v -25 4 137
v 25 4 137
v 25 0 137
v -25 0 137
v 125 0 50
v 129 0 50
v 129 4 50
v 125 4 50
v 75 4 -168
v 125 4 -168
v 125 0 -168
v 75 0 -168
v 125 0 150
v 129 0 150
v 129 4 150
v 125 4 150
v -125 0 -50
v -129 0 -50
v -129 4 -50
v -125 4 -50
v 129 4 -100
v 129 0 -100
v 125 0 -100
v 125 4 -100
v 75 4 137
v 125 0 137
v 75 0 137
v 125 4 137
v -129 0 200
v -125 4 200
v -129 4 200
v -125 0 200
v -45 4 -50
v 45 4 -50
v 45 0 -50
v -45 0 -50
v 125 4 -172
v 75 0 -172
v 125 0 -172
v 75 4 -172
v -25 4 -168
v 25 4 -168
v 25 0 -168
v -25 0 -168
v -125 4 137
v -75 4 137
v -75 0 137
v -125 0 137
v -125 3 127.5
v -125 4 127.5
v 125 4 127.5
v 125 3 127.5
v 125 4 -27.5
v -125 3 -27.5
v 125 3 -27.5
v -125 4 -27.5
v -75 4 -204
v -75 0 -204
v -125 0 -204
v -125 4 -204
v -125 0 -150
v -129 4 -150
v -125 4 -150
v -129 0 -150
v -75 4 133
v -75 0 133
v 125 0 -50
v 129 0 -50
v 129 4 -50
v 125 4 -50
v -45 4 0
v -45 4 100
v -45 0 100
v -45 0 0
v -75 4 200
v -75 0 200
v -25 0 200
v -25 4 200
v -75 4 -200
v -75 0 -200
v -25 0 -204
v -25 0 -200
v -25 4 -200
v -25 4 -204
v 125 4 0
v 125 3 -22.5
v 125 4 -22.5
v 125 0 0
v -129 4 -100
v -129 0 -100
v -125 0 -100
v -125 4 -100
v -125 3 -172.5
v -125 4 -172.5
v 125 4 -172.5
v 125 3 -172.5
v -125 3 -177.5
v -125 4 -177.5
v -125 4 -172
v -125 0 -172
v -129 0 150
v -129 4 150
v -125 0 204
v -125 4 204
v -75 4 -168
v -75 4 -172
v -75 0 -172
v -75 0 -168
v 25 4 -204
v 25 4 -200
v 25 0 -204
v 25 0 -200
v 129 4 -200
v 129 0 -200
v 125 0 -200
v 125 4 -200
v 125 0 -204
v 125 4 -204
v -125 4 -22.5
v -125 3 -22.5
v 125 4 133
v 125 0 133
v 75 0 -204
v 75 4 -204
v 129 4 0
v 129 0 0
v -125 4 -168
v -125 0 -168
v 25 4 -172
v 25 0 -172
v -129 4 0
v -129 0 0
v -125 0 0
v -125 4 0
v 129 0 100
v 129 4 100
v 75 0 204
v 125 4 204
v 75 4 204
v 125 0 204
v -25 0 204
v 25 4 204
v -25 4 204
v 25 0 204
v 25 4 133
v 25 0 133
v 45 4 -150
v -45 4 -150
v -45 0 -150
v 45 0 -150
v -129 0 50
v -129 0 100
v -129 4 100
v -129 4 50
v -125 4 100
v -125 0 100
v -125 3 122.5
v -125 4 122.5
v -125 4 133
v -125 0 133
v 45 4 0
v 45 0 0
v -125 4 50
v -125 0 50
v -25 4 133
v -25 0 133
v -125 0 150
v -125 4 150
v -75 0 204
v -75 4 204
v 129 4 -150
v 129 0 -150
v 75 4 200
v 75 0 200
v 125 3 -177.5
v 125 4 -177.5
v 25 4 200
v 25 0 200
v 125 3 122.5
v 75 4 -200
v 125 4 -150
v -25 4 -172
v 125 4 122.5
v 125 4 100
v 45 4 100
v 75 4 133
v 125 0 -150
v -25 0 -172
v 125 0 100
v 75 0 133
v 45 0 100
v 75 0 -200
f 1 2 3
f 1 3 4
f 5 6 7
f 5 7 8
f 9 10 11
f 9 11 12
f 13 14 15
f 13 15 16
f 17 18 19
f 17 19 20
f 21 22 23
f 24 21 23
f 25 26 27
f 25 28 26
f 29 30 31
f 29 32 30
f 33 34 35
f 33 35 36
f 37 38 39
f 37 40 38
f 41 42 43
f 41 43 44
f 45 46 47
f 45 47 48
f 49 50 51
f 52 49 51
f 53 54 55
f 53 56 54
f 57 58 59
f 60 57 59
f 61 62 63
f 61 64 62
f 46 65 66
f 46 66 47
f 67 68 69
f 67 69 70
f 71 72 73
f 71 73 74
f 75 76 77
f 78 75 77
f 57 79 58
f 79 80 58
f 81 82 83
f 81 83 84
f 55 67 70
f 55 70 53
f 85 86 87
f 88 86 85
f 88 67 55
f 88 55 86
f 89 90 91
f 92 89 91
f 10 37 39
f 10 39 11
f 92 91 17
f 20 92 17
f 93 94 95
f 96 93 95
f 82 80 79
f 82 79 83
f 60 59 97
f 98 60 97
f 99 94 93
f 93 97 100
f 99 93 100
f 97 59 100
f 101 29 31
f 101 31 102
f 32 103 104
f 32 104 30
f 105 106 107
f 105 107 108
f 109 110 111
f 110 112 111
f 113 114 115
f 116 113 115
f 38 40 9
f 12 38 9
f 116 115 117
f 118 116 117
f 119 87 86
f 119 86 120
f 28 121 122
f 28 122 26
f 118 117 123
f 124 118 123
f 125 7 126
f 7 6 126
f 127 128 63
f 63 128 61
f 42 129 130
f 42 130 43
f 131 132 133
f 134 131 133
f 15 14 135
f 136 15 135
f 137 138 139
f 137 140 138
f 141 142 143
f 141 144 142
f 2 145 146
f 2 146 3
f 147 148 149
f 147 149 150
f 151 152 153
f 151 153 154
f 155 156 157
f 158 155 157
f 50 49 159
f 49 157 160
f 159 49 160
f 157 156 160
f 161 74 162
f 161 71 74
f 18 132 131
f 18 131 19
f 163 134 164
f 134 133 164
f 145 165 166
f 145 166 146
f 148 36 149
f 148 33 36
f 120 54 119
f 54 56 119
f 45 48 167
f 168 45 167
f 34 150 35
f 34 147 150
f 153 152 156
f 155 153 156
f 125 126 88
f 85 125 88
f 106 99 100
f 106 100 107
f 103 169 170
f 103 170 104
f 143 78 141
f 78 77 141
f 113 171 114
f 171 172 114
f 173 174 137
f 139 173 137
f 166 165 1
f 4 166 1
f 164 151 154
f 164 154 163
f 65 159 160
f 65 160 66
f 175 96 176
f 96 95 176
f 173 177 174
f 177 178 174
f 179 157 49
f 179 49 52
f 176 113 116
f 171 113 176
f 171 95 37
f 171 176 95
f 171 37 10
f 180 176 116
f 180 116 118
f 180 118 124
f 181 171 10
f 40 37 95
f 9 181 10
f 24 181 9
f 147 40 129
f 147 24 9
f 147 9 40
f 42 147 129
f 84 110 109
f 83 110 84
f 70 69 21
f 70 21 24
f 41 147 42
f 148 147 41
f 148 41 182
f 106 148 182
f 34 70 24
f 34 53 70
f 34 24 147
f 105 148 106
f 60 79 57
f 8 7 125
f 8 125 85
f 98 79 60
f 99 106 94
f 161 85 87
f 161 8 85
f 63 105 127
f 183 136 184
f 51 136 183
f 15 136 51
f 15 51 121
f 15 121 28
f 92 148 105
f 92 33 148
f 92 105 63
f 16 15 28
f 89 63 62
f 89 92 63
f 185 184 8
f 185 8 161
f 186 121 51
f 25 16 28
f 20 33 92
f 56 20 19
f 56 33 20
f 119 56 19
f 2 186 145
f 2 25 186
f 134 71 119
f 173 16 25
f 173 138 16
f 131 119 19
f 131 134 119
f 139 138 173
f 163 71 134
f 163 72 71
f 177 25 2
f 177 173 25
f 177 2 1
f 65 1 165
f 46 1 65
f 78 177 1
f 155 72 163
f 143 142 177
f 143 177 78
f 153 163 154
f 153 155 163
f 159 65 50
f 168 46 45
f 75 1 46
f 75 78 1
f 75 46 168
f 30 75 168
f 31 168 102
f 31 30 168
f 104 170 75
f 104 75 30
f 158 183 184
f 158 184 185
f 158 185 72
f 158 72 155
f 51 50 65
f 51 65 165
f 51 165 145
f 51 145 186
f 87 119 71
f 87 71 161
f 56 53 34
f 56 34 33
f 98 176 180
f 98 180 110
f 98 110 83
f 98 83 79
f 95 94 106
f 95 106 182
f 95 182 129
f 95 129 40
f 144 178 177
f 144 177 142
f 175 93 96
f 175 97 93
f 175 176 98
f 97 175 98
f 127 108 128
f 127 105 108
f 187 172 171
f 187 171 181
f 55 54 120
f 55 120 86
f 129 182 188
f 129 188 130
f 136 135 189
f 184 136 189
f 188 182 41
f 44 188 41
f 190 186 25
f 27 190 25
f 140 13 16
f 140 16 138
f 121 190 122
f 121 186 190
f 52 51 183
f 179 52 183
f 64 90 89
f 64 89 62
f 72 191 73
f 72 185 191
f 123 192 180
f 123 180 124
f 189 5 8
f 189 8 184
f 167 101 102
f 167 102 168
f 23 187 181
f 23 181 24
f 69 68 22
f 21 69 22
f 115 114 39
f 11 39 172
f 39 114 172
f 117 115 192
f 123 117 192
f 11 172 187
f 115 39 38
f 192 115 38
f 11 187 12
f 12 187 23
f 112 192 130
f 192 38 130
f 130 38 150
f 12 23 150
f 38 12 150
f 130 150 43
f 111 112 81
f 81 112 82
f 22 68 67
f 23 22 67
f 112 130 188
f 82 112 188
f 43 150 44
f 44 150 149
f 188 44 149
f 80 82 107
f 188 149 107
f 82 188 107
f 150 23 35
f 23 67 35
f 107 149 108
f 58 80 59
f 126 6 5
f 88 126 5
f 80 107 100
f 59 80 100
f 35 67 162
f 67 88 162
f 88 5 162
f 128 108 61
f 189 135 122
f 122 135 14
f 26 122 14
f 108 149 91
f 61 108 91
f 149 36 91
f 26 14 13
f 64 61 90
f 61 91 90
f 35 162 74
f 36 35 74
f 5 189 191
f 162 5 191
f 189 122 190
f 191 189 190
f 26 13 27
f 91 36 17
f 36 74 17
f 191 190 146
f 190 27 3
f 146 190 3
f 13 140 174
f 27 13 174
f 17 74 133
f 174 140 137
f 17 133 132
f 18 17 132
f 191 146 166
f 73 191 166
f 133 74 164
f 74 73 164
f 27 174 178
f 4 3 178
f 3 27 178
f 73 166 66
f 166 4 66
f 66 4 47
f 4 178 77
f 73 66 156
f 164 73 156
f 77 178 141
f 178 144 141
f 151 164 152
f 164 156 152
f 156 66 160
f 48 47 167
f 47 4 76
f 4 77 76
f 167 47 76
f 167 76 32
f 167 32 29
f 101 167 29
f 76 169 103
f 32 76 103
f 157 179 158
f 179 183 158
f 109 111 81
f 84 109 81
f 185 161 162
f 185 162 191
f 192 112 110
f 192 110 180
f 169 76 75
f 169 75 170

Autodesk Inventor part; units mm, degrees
ref_plane "YZ Plane" through (0, 0, 0) normal (1, 0, 0) x (0, 1, 0)
ref_plane "XZ Plane" through (0, 0, 0) normal (0, 1, 0) x (-1, 0, 0)
ref_plane "XY Plane" through (0, 0, 0) normal (0, 0, 1) x (1, 0, 0)
sketch "Sketch1" plane through (0, 0, 0) normal (0, 1, 0) x (-1, 0, 0)
  line L0 (-125, 200) -> (125, 200) construction
  line L1 (125, 200) -> (125, -200) construction
  line L2 (125, -200) -> (-125, -200) construction
  line L3 (-125, -200) -> (-125, 200) construction
  line L4 (-125, 200) -> (125, -200) construction
  line L5 (125, 200) -> (-125, -200) construction
  line L6 (125, 200) -> (75, 200) construction
  line L7 (75, 200) -> (75, 204)
  line L8 (75, 204) -> (125, 204)
  line L9 (125, 204) -> (125, 200)
  line L10 (125, 200) -> (129, 200)
  line L11 (129, 200) -> (129, 150)
  line L12 (129, 150) -> (125, 150)
  line L13 (125, 150) -> (125, 200) construction
  line L14 (-125, 200) -> (-129, 200) construction
  line L15 (-129, 200) -> (-129, 150) construction
  line L16 (-129, 150) -> (-125, 150)
  line L17 (-125, 150) -> (-125, 200)
  line L18 (125, -200) -> (75, -200) construction
  line L19 (75, -200) -> (75, -204)
  line L20 (75, -204) -> (125, -204)
  line L21 (125, -204) -> (125, -200)
  line L22 (125, 100) -> (125, 150)
  line L23 (125, 150) -> (129, 150)
  line L24 (129, 100) -> (125, 100)
  line L25 (129, 150) -> (129, 100) construction
  line L26 (-125, 100) -> (-125, 150) construction
  line L27 (-125, 150) -> (-129, 150)
  line L28 (-129, 150) -> (-129, 100)
  line L29 (-129, 100) -> (-125, 100)
  line L30 (125, 50) -> (125, 100) construction
  line L31 (125, 100) -> (129, 100)
  line L32 (129, 50) -> (125, 50)
  line L33 (129, 100) -> (129, 50)
  line L34 (-125, 50) -> (-125, 100)
  line L35 (-125, 100) -> (-129, 100)
  line L36 (-129, 100) -> (-129, 50) construction
  line L37 (-129, 50) -> (-125, 50)
  line L38 (125, 0) -> (125, 50)
  line L39 (125, 50) -> (129, 50)
  line L40 (129, 0) -> (125, 0)
  line L41 (129, 50) -> (129, 0) construction
  line L42 (-125, 0) -> (-125, 50) construction
  line L43 (-125, 50) -> (-129, 50)
  line L44 (-129, 50) -> (-129, 0)
  line L45 (-129, 0) -> (-125, 0)
  line L46 (125, -50) -> (125, 0) construction
  line L47 (125, 0) -> (129, 0)
  line L48 (129, -50) -> (125, -50)
  line L49 (129, 0) -> (129, -50)
  line L50 (-125, -50) -> (-125, 0)
  line L51 (-125, 0) -> (-129, 0)
  line L52 (-129, 0) -> (-129, -50) construction
  line L53 (-129, -50) -> (-125, -50)
  line L54 (125, -100) -> (125, -50)
  line L55 (125, -50) -> (129, -50)
  line L56 (129, -100) -> (125, -100)
  line L57 (129, -50) -> (129, -100) construction
  line L58 (-125, -100) -> (-125, -50) construction
  line L59 (-125, -50) -> (-129, -50)
  line L60 (-129, -50) -> (-129, -100)
  line L61 (-129, -100) -> (-125, -100)
  line L62 (125, -150) -> (125, -100) construction
  line L63 (125, -100) -> (129, -100)
  line L64 (129, -150) -> (125, -150)
  line L65 (129, -100) -> (129, -150)
  line L66 (-125, -150) -> (-125, -100)
  line L67 (-125, -100) -> (-129, -100)
  line L68 (-129, -100) -> (-129, -150) construction
  line L69 (-129, -150) -> (-125, -150)
  line L70 (125, -200) -> (125, -150)
  line L71 (125, -150) -> (129, -150)
  line L72 (129, -200) -> (125, -200) construction
  line L73 (129, -150) -> (129, -200) construction
  line L74 (-125, -200) -> (-125, -150) construction
  line L75 (-125, -150) -> (-129, -150)
  line L76 (-129, -150) -> (-129, -200)
  line L77 (-129, -200) -> (-125, -200)
  line L78 (75, 204) -> (75, 200)
  line L79 (25, 200) -> (25, 204)
  line L80 (25, 204) -> (75, 204) construction
  line L81 (75, 200) -> (25, 200)
  line L82 (75, -200) -> (25, -200)
  line L83 (25, -200) -> (25, -204)
  line L84 (25, -204) -> (75, -204) construction
  line L85 (75, -204) -> (75, -200)
  line L86 (25, 204) -> (25, 200)
  line L87 (-25, 200) -> (-25, 204)
  line L88 (-25, 204) -> (25, 204)
  line L89 (25, 200) -> (-25, 200) construction
  line L90 (25, -200) -> (-25, -200) construction
  line L91 (-25, -200) -> (-25, -204)
  line L92 (-25, -204) -> (25, -204)
  line L93 (25, -204) -> (25, -200)
  line L94 (-25, 204) -> (-25, 200)
  line L95 (-75, 200) -> (-75, 204)
  line L96 (-75, 204) -> (-25, 204) construction
  line L97 (-25, 200) -> (-75, 200)
  line L98 (-25, -200) -> (-75, -200)
  line L99 (-75, -200) -> (-75, -204)
  line L100 (-75, -204) -> (-25, -204) construction
  line L101 (-25, -204) -> (-25, -200)
  line L102 (-75, 204) -> (-75, 200)
  line L103 (-125, 200) -> (-125, 204)
  line L104 (-125, 204) -> (-75, 204)
  line L105 (-75, 200) -> (-125, 200) construction
  line L106 (-75, -200) -> (-125, -200) construction
  line L107 (-125, -200) -> (-125, -204)
  line L108 (-125, -204) -> (-75, -204)
  line L109 (-75, -204) -> (-75, -200)
  point P0 (0, 0)
  dimension "d0" = 250
  dimension "d1" = 400
  dimension "d2" = 50
  dimension "d3" = 4
  dimension "d4" = 4
  dimension "d5" = 50
  dimension "d6" = 4
  dimension "d7" = 50
  dimension "d8" = 50
  dimension "d9" = 4
  dimension "d12" = 50
  dimension "d19" = 50
extrude "Extrusion1" add sketch "Sketch1" along normal blind 4
sketch "Sketch2" plane through (0, 4, 0) normal (0, 1, 0) x (1, 0, 0)
  line L0 (-125, 100) -> (-125, 50) projected
  line L1 (129, 100) -> (125, 100) projected
  line L2 (-125, 100) -> (125, 100) construction
  line L3 (125, -100) -> (125, -50) projected
  line L4 (125, -50) -> (-125, -50) construction
  line L5 (-45, 150) -> (45, 150)
  line L6 (45, 150) -> (45, 50)
  line L7 (45, 50) -> (-45, 50)
  line L8 (-45, 50) -> (-45, 150)
  line L9 (-45, 150) -> (45, 50) construction
  line L10 (45, 150) -> (-45, 50) construction
  line L11 (45, -100) -> (-45, -100)
  line L12 (-45, -100) -> (-45, 0)
  line L13 (-45, 0) -> (45, 0)
  line L14 (45, 0) -> (45, -100)
  line L15 (45, -100) -> (-45, 0) construction
  line L16 (-45, -100) -> (45, 0) construction
  point P0 (0, 0)
  point P1 (0, 100)
  point P2 (0, -50)
  point P3 (0, -50)
  dimension "d26" = 90
  dimension "d27" = 100
  dimension "d28" = 90
  dimension "d29" = 100
extrude "Extrusion2" cut sketch "Sketch2" against normal up to next
sketch "Sketch3" plane through (0, 4, 0) normal (0, 1, 0) x (1, 0, 0)
  line L0 (-129, 50) -> (-129, 0) projected
  line L1 (125, 0) -> (125, 50) projected
  line L2 (-129, 27.5) -> (125, 27.5)
  line L3 (125, 27.5) -> (125, 22.5)
  line L4 (125, 22.5) -> (-129, 22.5)
  line L5 (-129, 22.5) -> (-129, 27.5)
  line L6 (-129, 25) -> (125, 25) construction
  line L7 (-129, 27.5) -> (-125, 27.5)
  line L8 (-125, 27.5) -> (-125, 22.5)
  line L9 (-125, 22.5) -> (-129, 22.5)
  line L10 (-129, 22.5) -> (-129, 27.5)
  line L11 (-125, 0) -> (-125, -50) projected
  point P0 (0, 0)
  point P1 (-125, 27.5)
  point P2 (-125, 22.5)
  dimension "d32" = 5
extrude "Extrusion3" cut sketch "Sketch3" against normal blind 1 contours L2 L1 L4 L8
sketch "Sketch4" plane through (0, 4, 0) normal (0, 1, 0) x (1, 0, 0)
  line L0 (-125, -127.5) -> (125, -127.5)
  line L1 (125, -127.5) -> (125, -122.5)
  line L2 (125, -122.5) -> (-125, -122.5)
  line L3 (-125, -122.5) -> (-125, -127.5)
  line L4 (-125, -127.5) -> (125, -122.5) construction
  line L5 (125, -127.5) -> (-125, -122.5) construction
  line L6 (-125, -100) -> (-125, -150) projected
  line L7 (-125, -125) -> (129, -125) construction
  line L8 (129, -150) -> (129, -100) projected
  line L9 (129, 150) -> (129, 200) projected
  line L10 (129, 175) -> (-125, 175) construction
  line L11 (-125, 204) -> (-125, 150) projected
  line L12 (-125, 172.5) -> (125, 172.5)
  line L13 (125, 172.5) -> (125, 177.5)
  line L14 (125, 177.5) -> (-125, 177.5)
  line L15 (-125, 177.5) -> (-125, 172.5)
  line L16 (-125, 172.5) -> (125, 177.5) construction
  line L17 (125, 172.5) -> (-125, 177.5) construction
  line L18 (125, 100) -> (125, 150) projected
  line L19 (-125, 204) -> (-125, 150) projected
  point P0 (0, 0)
  point P1 (0, -125)
  point P2 (125, -125)
  point P3 (125, -100)
  point P4 (-125, -125)
  point P5 (-125, 22.5)
  point P6 (0, 175)
  dimension "d36" = 5
  dimension "d39" = 5
extrude "Extrusion4" cut sketch "Sketch4" against normal blind 1
sketch "Sketch5" plane through (0, 4, 0) normal (0, 1, 0) x (1, 0, 0)
  line L0 (-125, -133) -> (-75, -133)
  line L1 (-75, -133) -> (-75, -137)
  line L2 (-75, -137) -> (-125, -137)
  line L3 (-125, -137) -> (-125, -133)
  line L4 (-75, -200) -> (-25, -200) projected
  line L5 (-125, -100) -> (-125, -122.5) projected
  line L6 (125, -127.5) -> (-125, -127.5) projected
  line L7 (-75, -133) -> (-25, -133)
  line L8 (-25, -133) -> (-25, -137)
  line L9 (-25, -137) -> (-75, -137)
  line L10 (-75, -137) -> (-75, -133)
  line L11 (-25, -133) -> (25, -133)
  line L12 (25, -133) -> (25, -137)
  line L13 (25, -137) -> (-25, -137)
  line L14 (-25, -137) -> (-25, -133)
  line L15 (25, -133) -> (75, -133)
  line L16 (75, -133) -> (75, -137)
  line L17 (75, -137) -> (25, -137)
  line L18 (25, -137) -> (25, -133)
  line L19 (75, -133) -> (125, -133)
  line L20 (125, -133) -> (125, -137)
  line L21 (125, -137) -> (75, -137)
  line L22 (75, -137) -> (75, -133)
  line L23 (-25, 168) -> (-75, 168)
  line L24 (-75, 172) -> (-25, 172)
  line L25 (-25, 172) -> (-25, 168)
  line L26 (-25, 168) -> (-25, 172)
  line L27 (25, 168) -> (-25, 168)
  line L28 (-25, 172) -> (25, 172)
  line L29 (25, 172) -> (25, 168)
  line L30 (25, 168) -> (25, 172)
  line L31 (25, 172) -> (75, 172)
  line L32 (75, 168) -> (25, 168)
  line L33 (-75, 172) -> (-75, 168)
  line L34 (-75, 168) -> (-75, 172)
  line L35 (-125, 172) -> (-75, 172)
  line L36 (-125, 168) -> (-125, 172)
  line L37 (-75, 168) -> (-125, 168)
  line L38 (75, 172) -> (75, 168)
  line L39 (75, 168) -> (75, 172)
  line L40 (75, 172) -> (125, 172)
  line L41 (125, 172) -> (125, 168)
  line L42 (125, 168) -> (75, 168)
  point P0 (0, 0)
  dimension "d40" = 50
  dimension "d41" = 4
  dimension "d42" = 63
  dimension "d45" = 50
  dimension "d54" = 305
extrude "Extrusion5" cut sketch "Sketch5" against normal up to next contours L0 L1 L2 L3 | L11 L12 L13 L8 | L19 L20 L21 L16 | L25 L28 L29 L27 | L37 L36 L35 L33 | L38 L40 L41 L42
properties part number "DoorFront_V1"
